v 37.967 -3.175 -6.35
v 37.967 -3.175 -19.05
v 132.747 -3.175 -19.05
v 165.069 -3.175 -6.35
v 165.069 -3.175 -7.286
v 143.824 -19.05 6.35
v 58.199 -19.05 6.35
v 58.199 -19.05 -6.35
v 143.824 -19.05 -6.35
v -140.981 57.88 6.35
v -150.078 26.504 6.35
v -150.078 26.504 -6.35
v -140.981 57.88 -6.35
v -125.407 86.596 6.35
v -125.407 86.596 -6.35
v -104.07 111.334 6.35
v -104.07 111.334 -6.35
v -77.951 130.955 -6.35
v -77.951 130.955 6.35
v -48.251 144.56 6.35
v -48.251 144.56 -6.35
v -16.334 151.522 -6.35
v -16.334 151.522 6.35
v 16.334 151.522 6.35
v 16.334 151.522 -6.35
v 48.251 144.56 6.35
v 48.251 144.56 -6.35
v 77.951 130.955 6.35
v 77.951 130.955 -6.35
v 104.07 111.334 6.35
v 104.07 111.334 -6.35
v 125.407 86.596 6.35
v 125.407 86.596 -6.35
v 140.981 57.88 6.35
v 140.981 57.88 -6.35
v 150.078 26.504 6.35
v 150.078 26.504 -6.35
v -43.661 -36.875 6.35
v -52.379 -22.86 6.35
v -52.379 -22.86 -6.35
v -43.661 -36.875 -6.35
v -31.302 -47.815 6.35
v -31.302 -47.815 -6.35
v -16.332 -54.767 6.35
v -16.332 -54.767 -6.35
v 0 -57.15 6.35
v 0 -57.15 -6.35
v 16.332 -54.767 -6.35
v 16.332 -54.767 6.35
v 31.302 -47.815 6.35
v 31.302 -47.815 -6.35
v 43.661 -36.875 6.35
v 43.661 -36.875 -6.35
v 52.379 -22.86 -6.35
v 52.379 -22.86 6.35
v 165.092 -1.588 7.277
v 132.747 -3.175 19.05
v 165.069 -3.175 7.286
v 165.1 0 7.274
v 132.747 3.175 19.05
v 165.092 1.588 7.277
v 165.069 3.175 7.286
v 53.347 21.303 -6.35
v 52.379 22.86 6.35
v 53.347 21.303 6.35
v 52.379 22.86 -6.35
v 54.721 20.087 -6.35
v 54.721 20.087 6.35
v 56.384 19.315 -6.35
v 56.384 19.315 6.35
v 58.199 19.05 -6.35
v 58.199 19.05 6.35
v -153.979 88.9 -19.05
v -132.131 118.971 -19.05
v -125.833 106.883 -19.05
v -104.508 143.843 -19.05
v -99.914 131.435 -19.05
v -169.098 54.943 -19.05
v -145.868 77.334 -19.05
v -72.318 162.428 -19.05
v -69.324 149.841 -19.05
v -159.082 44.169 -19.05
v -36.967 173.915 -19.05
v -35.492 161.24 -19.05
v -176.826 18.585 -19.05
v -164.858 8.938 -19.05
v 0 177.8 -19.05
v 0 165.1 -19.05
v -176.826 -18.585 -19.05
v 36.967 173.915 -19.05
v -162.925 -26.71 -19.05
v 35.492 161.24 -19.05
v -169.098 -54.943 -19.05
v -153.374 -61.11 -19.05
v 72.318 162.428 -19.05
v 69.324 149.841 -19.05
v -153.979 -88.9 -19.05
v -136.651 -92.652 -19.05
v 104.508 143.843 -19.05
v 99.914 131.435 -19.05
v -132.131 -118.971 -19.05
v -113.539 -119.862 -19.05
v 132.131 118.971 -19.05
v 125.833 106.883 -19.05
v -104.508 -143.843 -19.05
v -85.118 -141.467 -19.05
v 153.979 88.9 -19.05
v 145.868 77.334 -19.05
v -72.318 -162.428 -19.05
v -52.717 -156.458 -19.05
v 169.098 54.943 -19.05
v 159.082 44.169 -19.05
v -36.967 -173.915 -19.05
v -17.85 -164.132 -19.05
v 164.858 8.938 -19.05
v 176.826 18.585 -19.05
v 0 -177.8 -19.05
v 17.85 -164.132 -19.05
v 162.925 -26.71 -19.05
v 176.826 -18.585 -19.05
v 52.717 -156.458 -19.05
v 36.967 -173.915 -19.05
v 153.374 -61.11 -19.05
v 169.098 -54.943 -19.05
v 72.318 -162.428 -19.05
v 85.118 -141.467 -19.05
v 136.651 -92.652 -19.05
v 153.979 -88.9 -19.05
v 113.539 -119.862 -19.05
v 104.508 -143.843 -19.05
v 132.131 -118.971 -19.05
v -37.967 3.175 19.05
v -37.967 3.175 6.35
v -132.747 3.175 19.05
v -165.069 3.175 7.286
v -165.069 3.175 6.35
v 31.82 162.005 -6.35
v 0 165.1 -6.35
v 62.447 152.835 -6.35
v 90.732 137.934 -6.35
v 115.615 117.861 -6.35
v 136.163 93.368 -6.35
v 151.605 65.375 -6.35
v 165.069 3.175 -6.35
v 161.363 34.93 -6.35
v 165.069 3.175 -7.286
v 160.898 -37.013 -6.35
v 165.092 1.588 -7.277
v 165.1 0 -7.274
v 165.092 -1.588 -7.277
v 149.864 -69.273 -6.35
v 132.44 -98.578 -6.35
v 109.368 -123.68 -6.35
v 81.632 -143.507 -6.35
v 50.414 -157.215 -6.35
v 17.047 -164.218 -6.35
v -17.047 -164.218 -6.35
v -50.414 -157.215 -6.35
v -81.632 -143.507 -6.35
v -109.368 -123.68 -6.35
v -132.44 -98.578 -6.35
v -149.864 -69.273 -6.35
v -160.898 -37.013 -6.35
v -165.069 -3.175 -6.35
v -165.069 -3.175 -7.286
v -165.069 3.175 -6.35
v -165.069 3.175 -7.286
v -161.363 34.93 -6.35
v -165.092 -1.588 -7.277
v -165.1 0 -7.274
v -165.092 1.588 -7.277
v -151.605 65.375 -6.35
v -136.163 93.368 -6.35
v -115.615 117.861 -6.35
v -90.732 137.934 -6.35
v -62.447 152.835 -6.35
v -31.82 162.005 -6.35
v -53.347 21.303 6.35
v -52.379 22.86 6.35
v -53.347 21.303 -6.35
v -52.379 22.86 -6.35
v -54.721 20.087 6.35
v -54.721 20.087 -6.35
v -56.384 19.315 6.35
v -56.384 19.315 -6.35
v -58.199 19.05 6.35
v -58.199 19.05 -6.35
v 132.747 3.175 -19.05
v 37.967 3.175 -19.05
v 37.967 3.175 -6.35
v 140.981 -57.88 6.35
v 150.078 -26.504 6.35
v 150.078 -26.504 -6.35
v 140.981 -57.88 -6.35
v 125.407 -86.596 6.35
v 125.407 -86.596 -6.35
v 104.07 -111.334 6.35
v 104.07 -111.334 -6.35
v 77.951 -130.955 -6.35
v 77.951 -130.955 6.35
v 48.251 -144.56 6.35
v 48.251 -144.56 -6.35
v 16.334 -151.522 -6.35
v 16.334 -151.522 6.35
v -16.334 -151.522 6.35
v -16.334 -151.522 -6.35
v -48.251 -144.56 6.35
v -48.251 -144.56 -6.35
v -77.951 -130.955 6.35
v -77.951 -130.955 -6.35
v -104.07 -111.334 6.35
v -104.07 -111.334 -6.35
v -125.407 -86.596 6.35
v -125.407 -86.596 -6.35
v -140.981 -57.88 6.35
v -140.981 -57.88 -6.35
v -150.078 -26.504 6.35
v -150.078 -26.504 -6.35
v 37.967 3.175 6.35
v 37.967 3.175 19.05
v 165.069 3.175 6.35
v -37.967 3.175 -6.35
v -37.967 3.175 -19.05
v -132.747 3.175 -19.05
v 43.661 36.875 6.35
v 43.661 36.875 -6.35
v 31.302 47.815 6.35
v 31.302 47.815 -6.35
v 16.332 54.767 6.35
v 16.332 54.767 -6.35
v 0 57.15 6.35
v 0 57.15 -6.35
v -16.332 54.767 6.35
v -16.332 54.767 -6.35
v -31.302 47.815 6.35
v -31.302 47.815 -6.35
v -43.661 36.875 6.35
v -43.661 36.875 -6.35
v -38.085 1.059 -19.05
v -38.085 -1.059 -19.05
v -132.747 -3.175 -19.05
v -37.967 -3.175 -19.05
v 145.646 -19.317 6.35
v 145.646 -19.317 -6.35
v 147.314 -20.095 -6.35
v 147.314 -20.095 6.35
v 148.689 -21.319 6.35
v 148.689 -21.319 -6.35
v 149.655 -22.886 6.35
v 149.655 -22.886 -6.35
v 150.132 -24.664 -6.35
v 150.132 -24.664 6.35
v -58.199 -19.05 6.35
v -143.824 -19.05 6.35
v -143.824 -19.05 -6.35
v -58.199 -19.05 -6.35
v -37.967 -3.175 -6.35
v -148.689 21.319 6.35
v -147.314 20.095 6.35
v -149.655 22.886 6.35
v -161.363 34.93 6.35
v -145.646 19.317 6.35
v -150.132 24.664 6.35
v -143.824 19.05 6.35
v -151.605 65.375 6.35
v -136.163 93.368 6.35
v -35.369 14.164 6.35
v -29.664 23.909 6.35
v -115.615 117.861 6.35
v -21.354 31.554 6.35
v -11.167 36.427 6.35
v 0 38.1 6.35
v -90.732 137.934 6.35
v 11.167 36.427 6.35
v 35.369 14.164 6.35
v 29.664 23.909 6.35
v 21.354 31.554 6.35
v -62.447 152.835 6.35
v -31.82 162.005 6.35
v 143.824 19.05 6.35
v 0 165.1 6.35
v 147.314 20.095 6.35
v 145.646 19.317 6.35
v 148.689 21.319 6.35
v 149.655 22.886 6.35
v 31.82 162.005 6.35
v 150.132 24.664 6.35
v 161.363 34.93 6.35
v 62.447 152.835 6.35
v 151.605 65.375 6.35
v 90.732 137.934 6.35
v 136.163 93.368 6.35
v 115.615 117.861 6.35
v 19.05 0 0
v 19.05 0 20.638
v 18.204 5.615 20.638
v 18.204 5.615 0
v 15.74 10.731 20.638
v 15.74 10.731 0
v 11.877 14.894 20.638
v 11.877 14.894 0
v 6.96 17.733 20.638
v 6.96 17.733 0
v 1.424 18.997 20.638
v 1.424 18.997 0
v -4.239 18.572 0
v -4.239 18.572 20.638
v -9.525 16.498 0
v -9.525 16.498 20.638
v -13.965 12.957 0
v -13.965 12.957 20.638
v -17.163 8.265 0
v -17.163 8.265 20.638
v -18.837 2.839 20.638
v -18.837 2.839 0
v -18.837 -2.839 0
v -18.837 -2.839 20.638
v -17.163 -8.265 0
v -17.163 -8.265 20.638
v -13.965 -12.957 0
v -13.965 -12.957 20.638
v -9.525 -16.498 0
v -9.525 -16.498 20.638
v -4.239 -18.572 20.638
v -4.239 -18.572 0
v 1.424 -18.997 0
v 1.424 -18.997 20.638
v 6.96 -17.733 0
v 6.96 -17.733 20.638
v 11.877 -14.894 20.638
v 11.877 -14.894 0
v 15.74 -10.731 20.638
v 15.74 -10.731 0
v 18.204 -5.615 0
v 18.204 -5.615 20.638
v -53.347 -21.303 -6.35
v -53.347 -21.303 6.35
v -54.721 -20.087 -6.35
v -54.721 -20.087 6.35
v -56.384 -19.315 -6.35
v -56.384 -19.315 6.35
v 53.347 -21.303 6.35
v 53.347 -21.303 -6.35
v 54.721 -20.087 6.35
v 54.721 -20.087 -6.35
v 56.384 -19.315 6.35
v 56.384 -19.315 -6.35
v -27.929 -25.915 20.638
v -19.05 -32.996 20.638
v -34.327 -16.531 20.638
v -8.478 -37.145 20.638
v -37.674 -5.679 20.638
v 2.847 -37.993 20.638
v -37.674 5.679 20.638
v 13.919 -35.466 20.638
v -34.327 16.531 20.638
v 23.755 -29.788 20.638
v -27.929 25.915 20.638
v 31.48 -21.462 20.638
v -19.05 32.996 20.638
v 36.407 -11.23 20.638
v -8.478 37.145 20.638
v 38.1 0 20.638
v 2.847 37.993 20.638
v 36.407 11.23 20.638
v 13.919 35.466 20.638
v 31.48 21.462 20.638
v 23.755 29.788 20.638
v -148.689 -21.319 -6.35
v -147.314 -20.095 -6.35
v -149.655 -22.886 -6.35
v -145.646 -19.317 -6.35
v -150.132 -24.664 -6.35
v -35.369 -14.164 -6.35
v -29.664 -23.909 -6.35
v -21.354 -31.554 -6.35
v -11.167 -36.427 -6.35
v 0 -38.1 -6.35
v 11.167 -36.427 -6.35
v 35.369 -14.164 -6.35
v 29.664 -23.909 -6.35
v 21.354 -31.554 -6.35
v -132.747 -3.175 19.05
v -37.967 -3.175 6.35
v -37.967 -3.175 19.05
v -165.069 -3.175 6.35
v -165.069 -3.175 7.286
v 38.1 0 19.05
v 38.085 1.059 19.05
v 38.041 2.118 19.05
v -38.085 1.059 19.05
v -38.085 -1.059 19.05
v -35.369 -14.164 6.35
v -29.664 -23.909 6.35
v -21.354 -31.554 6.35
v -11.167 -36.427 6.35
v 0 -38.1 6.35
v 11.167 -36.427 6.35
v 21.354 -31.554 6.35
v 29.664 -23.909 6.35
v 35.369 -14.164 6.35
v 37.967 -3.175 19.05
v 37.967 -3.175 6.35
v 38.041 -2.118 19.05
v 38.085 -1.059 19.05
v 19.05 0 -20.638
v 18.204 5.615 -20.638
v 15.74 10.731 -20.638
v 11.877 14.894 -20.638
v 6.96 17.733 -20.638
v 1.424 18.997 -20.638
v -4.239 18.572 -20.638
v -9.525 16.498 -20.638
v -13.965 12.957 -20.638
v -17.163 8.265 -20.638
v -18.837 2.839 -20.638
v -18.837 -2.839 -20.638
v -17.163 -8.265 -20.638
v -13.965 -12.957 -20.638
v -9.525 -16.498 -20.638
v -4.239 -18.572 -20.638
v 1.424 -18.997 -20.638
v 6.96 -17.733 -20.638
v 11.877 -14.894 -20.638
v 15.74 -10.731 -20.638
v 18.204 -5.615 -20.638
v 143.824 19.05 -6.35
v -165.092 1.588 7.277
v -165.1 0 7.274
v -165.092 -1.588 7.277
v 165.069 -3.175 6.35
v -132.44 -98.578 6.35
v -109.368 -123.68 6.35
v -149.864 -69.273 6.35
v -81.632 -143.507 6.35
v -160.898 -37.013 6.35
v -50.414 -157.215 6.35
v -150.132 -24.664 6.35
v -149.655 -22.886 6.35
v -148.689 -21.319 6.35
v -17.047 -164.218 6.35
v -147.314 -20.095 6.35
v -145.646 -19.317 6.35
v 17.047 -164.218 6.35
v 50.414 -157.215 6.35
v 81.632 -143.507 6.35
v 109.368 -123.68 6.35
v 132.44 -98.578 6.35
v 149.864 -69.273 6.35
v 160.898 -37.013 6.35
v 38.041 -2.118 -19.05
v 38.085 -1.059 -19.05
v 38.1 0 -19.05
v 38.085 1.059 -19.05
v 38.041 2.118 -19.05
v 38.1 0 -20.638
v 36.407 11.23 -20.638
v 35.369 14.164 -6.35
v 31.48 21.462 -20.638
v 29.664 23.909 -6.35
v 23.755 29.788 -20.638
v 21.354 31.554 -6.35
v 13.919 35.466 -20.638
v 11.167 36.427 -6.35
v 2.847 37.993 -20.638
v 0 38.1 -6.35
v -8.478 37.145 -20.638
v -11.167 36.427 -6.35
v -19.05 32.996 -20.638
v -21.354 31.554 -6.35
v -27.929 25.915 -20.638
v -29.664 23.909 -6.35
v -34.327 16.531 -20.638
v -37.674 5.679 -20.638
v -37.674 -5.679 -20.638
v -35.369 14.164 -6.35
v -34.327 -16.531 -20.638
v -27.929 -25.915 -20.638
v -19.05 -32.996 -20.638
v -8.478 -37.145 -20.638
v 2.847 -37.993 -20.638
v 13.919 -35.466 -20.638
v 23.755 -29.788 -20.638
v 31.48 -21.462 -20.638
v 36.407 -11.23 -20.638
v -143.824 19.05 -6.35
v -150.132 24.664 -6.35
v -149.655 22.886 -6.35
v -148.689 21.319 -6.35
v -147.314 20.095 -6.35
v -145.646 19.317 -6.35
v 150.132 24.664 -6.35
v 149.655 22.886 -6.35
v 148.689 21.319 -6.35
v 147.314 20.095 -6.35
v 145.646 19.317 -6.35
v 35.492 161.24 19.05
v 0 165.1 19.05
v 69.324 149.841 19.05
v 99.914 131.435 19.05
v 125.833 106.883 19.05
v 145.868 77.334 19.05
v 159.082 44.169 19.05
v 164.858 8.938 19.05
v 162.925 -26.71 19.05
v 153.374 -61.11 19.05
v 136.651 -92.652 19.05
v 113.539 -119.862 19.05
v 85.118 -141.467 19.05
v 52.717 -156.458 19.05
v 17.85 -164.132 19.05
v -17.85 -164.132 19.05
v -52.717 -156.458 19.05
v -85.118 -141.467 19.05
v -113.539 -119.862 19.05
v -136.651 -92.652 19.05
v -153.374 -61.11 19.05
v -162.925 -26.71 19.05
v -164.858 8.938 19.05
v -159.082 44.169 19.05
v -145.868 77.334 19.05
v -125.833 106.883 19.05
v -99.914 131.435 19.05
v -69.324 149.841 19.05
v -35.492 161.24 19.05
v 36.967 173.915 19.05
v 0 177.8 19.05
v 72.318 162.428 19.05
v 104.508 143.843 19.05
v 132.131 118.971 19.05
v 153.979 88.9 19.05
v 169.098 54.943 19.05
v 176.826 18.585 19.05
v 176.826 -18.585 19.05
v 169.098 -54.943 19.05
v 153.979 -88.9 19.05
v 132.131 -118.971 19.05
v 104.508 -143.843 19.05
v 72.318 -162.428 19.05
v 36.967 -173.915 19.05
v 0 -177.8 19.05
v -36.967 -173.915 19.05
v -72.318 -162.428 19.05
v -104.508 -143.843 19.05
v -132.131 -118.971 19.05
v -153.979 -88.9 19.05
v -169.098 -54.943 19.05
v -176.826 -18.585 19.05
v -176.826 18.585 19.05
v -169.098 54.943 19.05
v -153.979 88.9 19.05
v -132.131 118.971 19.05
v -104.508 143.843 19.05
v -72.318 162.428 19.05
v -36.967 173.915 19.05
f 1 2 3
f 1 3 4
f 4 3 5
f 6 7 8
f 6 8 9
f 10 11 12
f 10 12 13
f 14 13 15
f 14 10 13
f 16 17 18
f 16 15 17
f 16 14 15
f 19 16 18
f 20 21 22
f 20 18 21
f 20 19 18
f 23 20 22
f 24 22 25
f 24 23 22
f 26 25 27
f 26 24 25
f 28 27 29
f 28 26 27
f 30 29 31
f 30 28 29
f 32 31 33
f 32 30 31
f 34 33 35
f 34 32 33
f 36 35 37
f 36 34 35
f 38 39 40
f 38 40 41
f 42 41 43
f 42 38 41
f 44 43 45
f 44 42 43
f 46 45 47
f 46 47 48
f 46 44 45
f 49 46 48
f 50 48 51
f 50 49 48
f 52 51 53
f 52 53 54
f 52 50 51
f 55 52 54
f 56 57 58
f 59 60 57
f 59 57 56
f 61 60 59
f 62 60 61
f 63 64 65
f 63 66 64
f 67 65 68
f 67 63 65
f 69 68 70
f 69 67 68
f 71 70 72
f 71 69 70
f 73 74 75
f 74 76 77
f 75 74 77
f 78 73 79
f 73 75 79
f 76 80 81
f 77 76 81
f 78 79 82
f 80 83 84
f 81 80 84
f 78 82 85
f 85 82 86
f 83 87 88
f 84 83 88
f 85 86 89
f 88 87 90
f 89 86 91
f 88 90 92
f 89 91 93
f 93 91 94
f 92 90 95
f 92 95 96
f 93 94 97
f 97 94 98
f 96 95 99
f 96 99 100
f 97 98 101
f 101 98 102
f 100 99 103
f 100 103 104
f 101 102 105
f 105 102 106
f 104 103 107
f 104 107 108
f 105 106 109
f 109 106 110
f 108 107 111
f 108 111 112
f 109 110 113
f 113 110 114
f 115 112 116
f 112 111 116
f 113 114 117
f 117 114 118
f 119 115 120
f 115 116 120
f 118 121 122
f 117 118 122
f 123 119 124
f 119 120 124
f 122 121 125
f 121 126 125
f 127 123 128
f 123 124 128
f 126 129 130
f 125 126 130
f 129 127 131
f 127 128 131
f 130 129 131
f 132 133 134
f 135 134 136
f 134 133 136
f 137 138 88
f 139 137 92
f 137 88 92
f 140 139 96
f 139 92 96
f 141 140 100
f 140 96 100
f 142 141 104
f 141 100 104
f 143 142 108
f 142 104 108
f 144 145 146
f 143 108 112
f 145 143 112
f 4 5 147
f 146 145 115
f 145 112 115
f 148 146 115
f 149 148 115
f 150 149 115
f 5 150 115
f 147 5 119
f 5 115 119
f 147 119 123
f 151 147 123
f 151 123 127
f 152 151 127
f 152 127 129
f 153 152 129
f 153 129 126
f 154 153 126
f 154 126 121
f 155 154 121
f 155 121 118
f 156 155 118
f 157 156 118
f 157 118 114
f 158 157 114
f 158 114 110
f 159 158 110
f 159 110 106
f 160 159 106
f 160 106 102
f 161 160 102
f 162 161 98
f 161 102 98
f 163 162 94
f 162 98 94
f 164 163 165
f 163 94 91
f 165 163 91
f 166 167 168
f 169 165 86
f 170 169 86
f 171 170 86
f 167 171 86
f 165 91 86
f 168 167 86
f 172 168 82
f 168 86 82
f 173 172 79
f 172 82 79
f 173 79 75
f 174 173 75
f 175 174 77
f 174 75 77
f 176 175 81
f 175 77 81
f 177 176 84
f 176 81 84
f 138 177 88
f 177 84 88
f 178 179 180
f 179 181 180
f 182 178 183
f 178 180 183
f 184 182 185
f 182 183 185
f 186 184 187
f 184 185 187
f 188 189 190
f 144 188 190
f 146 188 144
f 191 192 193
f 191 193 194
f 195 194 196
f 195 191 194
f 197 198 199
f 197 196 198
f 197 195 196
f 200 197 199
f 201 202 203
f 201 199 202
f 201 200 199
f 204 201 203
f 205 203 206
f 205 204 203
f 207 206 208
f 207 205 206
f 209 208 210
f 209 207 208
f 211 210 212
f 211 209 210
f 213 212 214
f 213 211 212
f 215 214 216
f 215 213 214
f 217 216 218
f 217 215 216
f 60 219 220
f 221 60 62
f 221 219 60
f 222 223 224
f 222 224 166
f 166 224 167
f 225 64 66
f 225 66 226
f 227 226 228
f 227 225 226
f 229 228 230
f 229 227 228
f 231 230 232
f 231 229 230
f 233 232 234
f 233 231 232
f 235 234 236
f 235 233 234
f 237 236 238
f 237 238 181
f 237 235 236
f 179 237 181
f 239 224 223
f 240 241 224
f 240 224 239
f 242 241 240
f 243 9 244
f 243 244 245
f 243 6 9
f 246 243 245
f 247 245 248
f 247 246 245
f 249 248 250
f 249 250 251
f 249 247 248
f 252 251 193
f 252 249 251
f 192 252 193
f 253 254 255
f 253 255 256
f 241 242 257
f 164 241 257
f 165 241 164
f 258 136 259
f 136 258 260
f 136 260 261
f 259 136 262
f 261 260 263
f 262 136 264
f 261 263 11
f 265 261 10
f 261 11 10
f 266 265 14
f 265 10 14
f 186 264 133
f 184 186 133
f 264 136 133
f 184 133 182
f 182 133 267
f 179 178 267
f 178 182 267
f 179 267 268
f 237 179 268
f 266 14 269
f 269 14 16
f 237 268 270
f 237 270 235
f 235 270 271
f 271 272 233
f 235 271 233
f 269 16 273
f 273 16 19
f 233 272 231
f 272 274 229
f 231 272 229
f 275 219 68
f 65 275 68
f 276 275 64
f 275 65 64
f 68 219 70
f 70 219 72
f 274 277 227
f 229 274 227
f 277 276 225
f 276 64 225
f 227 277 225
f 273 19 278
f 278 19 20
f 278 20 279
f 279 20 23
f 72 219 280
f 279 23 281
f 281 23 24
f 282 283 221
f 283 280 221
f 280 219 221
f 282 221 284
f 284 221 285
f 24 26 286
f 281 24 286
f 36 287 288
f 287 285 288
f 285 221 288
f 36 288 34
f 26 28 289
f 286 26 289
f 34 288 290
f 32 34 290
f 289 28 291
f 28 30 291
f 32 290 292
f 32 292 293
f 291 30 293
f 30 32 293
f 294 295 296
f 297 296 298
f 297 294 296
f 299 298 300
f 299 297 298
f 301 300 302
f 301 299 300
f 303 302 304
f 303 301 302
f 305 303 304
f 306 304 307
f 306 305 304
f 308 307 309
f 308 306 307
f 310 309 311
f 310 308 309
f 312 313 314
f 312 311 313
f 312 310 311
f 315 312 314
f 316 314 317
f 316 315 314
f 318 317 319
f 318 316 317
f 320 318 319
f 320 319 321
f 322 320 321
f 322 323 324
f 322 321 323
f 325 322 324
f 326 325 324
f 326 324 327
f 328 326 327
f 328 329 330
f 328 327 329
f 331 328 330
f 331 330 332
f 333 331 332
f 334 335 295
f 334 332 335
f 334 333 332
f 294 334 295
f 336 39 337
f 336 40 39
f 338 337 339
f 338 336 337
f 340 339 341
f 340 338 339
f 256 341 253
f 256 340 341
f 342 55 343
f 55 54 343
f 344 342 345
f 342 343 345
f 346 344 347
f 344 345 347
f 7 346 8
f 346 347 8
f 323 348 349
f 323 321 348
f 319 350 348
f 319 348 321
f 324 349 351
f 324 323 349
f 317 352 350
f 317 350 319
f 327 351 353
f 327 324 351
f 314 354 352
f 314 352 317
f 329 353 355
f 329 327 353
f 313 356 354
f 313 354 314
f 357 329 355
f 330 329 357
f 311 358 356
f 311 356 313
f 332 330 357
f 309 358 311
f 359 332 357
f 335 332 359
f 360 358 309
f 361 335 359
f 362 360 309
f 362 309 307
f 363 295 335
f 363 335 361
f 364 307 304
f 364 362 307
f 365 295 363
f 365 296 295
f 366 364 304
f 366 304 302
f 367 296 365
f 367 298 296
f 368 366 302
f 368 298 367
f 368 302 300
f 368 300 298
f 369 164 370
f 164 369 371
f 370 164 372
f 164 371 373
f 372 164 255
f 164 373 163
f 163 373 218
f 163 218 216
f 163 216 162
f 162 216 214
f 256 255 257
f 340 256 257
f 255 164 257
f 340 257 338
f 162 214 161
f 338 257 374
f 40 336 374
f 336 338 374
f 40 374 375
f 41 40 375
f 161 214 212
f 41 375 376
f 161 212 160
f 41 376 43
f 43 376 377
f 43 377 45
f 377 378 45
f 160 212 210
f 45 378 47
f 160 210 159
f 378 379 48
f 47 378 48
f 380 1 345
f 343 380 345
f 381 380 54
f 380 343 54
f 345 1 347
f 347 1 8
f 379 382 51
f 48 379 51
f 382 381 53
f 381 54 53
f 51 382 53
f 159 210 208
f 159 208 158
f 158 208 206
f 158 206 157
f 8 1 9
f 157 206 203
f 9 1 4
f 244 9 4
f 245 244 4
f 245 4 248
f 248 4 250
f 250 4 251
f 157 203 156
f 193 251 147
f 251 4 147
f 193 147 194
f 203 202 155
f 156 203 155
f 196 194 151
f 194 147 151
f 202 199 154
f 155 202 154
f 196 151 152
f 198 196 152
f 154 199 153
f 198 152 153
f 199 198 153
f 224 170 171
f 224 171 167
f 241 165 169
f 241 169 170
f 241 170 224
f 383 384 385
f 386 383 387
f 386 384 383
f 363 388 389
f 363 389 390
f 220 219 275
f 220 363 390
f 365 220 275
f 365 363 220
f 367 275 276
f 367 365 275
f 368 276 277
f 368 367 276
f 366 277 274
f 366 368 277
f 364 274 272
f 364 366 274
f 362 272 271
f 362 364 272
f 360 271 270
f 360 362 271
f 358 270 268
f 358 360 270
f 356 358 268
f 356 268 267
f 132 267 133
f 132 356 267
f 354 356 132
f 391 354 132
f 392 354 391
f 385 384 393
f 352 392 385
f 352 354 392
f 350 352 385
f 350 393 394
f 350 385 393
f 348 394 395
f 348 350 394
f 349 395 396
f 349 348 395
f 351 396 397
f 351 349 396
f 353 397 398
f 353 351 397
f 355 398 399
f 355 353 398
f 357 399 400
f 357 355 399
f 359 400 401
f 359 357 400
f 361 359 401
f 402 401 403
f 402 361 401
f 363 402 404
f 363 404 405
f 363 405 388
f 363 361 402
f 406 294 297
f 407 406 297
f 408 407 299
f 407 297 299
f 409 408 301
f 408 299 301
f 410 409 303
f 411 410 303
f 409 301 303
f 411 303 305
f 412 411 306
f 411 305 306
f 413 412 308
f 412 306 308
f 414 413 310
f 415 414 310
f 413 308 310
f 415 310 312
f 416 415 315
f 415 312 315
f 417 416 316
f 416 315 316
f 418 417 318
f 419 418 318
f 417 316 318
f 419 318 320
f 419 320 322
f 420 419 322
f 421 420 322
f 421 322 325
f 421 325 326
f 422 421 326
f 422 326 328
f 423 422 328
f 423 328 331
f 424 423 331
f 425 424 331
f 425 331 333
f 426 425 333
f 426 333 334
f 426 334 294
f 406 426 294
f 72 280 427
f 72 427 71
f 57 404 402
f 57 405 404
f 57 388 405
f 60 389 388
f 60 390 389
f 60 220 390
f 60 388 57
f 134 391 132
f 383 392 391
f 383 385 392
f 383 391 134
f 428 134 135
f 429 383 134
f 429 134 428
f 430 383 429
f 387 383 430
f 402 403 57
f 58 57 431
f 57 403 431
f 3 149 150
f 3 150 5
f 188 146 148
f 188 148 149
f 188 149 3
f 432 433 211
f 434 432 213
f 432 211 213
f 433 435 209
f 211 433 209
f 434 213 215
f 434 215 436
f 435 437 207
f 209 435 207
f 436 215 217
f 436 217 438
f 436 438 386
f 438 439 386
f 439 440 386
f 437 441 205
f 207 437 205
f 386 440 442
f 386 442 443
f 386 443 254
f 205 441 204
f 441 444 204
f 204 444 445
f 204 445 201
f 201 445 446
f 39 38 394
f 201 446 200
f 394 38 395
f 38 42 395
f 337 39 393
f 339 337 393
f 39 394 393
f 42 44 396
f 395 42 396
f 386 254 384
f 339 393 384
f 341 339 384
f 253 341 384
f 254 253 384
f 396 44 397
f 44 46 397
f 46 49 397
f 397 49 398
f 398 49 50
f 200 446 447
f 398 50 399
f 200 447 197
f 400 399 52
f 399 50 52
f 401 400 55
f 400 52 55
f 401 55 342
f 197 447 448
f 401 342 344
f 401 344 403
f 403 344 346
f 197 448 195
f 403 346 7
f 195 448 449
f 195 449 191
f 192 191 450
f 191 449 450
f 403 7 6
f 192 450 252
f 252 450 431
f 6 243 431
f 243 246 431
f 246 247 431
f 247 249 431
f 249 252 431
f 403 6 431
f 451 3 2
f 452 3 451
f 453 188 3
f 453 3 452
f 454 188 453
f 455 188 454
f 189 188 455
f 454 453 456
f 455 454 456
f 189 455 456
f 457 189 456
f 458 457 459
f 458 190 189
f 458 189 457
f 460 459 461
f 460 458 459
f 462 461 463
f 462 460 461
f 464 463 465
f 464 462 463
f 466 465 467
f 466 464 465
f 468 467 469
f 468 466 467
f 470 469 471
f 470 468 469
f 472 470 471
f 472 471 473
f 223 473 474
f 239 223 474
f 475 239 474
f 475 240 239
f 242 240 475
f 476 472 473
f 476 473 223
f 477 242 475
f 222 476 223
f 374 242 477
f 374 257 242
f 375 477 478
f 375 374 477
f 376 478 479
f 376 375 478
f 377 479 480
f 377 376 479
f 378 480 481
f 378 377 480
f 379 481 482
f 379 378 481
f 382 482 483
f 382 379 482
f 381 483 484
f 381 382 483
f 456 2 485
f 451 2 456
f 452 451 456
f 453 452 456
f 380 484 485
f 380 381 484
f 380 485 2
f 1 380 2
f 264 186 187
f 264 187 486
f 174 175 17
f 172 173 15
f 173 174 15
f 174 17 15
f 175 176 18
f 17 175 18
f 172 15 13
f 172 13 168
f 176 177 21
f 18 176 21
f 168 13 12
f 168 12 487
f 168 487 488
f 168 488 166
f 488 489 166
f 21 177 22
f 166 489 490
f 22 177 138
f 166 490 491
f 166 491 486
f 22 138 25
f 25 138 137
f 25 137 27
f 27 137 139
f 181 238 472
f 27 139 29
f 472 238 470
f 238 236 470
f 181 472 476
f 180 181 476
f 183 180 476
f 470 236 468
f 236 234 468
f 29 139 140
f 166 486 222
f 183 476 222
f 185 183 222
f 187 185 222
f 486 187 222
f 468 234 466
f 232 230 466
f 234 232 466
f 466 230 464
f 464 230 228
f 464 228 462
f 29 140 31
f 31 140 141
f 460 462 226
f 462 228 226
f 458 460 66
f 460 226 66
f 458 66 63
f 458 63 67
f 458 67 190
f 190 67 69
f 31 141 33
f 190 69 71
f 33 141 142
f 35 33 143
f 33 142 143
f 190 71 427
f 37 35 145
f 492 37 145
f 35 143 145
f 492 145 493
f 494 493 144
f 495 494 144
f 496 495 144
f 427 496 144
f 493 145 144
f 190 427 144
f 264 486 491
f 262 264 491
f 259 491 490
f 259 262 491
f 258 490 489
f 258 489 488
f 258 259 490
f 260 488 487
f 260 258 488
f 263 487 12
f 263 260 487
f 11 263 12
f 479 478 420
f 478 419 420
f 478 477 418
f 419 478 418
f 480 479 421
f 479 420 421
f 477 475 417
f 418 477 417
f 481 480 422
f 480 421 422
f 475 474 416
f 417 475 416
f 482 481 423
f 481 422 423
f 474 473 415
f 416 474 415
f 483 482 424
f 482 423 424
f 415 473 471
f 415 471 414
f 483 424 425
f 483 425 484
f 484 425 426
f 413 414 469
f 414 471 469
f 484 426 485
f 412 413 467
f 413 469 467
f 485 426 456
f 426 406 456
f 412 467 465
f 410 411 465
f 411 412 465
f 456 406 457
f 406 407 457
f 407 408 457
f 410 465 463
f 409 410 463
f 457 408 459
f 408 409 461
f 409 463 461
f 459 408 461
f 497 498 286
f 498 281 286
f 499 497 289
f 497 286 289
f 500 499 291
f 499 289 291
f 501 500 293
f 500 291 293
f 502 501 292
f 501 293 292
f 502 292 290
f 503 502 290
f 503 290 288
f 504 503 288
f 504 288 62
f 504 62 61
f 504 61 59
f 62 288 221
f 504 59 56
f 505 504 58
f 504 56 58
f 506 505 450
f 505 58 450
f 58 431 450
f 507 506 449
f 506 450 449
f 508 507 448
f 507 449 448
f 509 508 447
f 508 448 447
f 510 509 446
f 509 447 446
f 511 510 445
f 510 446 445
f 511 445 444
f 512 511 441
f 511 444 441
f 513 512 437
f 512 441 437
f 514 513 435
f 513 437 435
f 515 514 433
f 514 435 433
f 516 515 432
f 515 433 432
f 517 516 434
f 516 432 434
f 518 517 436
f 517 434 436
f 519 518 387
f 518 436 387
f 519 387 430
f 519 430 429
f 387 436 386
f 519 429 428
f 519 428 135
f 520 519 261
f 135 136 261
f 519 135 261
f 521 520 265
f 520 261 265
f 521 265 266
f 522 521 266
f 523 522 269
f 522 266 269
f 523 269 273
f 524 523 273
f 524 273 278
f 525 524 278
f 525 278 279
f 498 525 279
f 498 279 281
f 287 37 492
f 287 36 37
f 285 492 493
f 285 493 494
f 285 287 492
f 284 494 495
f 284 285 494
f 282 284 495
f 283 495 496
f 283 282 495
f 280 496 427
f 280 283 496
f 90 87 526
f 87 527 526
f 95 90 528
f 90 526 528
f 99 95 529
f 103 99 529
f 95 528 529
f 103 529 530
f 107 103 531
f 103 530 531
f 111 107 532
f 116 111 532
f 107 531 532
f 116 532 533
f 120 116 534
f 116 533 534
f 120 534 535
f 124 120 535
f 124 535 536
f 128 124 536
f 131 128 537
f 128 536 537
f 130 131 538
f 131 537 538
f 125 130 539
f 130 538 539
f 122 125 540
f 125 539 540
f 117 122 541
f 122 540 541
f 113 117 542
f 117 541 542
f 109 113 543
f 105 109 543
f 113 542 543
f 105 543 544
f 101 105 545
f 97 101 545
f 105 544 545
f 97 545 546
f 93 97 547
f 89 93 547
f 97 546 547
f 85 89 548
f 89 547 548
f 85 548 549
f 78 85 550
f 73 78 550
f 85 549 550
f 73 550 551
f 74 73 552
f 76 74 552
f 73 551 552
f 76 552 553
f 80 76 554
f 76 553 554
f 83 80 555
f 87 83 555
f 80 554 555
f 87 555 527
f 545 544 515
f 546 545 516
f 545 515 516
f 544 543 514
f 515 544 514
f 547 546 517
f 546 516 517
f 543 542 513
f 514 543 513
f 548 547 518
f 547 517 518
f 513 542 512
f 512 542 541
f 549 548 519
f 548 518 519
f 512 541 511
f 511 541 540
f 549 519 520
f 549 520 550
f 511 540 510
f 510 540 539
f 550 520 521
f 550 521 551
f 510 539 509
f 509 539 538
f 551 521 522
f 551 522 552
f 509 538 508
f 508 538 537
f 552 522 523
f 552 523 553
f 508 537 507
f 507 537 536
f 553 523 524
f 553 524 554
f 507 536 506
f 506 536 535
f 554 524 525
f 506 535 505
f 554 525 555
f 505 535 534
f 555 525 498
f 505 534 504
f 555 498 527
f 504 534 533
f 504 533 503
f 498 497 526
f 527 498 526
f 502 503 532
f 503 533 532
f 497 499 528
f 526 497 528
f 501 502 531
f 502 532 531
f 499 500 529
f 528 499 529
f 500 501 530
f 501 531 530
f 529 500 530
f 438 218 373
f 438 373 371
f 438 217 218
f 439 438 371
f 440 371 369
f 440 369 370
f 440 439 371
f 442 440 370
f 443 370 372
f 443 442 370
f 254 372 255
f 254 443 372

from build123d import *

# Parameters (mm, degrees)
SKETCH1_R                = 38.1
CENTERHUB_DEPTH          = 20.6375
RIB_DEPTH                = 3.175
LIGHTENING_HOLE_DEPTH    = 21.6375
FILLET1_R                = 6.35
CIRPATTERN1_COUNT        = 2
FILLET1_OF_CIRPATTERN1_R = 6.35
SKETCH5_R                = 19.05
THRU_HOLE_DEPTH          = 21.6375
THRU_HOLE_DEPTH_BACK     = 21.6375


with BuildPart() as part:
    # Sketch1 → CenterHub (new body, symmetric)
    with BuildSketch(Plane.XY):
        Circle(SKETCH1_R)
    extrude(amount=CENTERHUB_DEPTH, both=True)

    # Sketch2 → Rim and Web (revolve)
    with BuildSketch(Plane(origin=(0, 0, 0), x_dir=(0, 0, -1), z_dir=(1, 0, 0))):
        Polygon((-6.35, 0), (6.35, 0), (6.35, 165.1), (19.05, 165.1), (19.05, 177.8), (-19.05, 177.8), (-19.05, 165.1), (-6.35, 165.1), align=None)
    revolve(axis=Axis((0, 0, 0), (0, 0, -1)))

    # Sketch3 → Rib (add, symmetric)
    with BuildSketch(Plane(origin=(0, 0, 0), x_dir=(1, 0, 0), z_dir=(0, 1, 0))):
        Polygon((0, -19.05), (132.747036773, -19.05), (167.64, -6.35), (167.64, 6.35), (132.747036773, 19.05), (0, 19.05), align=None)
    rib = extrude(amount=RIB_DEPTH, both=True)

    # Sketch4 → Lightening hole (cut, symmetric)
    with BuildSketch(Plane.XY):
        with BuildLine():
            Line((-151.204687427, -19.05), (-53.881536726, -19.05))
            ThreePointArc((-53.881536726, -19.05), (0, -57.15), (53.881536726, -19.05))
            Line((53.881536726, -19.05), (151.204687427, -19.05))
            ThreePointArc((151.204687427, -19.05), (0, -152.4), (-151.204687427, -19.05))
        make_face()
    lightening_hole = extrude(amount=LIGHTENING_HOLE_DEPTH, both=True, mode=Mode.SUBTRACT)

    # Fillet1
    fillet1_edges = [part.edges().sort_by_distance(p)[0] for p in [
        (151.204687427, -19.05, 0),
        (-151.204687427, -19.05, 0),
        (-53.881536726, -19.05, 0),
        (53.881536726, -19.05, 0),
    ]]
    fillet(fillet1_edges, radius=FILLET1_R)

    # CirPattern1: Rib, Lightening hole ×2 about axis
    cirpattern1_axis = Axis((0, 0, 0), (0, 0, 1))
    for i in range(1, CIRPATTERN1_COUNT):
        add(rib.rotate(cirpattern1_axis, i * 360 / CIRPATTERN1_COUNT))
        add(lightening_hole.rotate(cirpattern1_axis, i * 360 / CIRPATTERN1_COUNT), mode=Mode.SUBTRACT)

    # Fillet1 of CirPattern1
    fillet1_of_cirpattern1_edges = [part.edges().sort_by_distance(p)[0] for p in [
        (-151.204687427, 19.05, 0),
        (151.204687427, 19.05, 0),
        (53.881536726, 19.05, 0),
        (-53.881536726, 19.05, 0),
    ]]
    fillet(fillet1_of_cirpattern1_edges, radius=FILLET1_OF_CIRPATTERN1_R)

    # Sketch5 → Thru hole (cut, two sides)
    with BuildSketch(Plane.XY) as thru_hole_sk:
        Circle(SKETCH5_R)
    extrude(amount=THRU_HOLE_DEPTH, mode=Mode.SUBTRACT)
    extrude(thru_hole_sk.sketch, amount=-THRU_HOLE_DEPTH_BACK, mode=Mode.SUBTRACT)


solid = part.part
